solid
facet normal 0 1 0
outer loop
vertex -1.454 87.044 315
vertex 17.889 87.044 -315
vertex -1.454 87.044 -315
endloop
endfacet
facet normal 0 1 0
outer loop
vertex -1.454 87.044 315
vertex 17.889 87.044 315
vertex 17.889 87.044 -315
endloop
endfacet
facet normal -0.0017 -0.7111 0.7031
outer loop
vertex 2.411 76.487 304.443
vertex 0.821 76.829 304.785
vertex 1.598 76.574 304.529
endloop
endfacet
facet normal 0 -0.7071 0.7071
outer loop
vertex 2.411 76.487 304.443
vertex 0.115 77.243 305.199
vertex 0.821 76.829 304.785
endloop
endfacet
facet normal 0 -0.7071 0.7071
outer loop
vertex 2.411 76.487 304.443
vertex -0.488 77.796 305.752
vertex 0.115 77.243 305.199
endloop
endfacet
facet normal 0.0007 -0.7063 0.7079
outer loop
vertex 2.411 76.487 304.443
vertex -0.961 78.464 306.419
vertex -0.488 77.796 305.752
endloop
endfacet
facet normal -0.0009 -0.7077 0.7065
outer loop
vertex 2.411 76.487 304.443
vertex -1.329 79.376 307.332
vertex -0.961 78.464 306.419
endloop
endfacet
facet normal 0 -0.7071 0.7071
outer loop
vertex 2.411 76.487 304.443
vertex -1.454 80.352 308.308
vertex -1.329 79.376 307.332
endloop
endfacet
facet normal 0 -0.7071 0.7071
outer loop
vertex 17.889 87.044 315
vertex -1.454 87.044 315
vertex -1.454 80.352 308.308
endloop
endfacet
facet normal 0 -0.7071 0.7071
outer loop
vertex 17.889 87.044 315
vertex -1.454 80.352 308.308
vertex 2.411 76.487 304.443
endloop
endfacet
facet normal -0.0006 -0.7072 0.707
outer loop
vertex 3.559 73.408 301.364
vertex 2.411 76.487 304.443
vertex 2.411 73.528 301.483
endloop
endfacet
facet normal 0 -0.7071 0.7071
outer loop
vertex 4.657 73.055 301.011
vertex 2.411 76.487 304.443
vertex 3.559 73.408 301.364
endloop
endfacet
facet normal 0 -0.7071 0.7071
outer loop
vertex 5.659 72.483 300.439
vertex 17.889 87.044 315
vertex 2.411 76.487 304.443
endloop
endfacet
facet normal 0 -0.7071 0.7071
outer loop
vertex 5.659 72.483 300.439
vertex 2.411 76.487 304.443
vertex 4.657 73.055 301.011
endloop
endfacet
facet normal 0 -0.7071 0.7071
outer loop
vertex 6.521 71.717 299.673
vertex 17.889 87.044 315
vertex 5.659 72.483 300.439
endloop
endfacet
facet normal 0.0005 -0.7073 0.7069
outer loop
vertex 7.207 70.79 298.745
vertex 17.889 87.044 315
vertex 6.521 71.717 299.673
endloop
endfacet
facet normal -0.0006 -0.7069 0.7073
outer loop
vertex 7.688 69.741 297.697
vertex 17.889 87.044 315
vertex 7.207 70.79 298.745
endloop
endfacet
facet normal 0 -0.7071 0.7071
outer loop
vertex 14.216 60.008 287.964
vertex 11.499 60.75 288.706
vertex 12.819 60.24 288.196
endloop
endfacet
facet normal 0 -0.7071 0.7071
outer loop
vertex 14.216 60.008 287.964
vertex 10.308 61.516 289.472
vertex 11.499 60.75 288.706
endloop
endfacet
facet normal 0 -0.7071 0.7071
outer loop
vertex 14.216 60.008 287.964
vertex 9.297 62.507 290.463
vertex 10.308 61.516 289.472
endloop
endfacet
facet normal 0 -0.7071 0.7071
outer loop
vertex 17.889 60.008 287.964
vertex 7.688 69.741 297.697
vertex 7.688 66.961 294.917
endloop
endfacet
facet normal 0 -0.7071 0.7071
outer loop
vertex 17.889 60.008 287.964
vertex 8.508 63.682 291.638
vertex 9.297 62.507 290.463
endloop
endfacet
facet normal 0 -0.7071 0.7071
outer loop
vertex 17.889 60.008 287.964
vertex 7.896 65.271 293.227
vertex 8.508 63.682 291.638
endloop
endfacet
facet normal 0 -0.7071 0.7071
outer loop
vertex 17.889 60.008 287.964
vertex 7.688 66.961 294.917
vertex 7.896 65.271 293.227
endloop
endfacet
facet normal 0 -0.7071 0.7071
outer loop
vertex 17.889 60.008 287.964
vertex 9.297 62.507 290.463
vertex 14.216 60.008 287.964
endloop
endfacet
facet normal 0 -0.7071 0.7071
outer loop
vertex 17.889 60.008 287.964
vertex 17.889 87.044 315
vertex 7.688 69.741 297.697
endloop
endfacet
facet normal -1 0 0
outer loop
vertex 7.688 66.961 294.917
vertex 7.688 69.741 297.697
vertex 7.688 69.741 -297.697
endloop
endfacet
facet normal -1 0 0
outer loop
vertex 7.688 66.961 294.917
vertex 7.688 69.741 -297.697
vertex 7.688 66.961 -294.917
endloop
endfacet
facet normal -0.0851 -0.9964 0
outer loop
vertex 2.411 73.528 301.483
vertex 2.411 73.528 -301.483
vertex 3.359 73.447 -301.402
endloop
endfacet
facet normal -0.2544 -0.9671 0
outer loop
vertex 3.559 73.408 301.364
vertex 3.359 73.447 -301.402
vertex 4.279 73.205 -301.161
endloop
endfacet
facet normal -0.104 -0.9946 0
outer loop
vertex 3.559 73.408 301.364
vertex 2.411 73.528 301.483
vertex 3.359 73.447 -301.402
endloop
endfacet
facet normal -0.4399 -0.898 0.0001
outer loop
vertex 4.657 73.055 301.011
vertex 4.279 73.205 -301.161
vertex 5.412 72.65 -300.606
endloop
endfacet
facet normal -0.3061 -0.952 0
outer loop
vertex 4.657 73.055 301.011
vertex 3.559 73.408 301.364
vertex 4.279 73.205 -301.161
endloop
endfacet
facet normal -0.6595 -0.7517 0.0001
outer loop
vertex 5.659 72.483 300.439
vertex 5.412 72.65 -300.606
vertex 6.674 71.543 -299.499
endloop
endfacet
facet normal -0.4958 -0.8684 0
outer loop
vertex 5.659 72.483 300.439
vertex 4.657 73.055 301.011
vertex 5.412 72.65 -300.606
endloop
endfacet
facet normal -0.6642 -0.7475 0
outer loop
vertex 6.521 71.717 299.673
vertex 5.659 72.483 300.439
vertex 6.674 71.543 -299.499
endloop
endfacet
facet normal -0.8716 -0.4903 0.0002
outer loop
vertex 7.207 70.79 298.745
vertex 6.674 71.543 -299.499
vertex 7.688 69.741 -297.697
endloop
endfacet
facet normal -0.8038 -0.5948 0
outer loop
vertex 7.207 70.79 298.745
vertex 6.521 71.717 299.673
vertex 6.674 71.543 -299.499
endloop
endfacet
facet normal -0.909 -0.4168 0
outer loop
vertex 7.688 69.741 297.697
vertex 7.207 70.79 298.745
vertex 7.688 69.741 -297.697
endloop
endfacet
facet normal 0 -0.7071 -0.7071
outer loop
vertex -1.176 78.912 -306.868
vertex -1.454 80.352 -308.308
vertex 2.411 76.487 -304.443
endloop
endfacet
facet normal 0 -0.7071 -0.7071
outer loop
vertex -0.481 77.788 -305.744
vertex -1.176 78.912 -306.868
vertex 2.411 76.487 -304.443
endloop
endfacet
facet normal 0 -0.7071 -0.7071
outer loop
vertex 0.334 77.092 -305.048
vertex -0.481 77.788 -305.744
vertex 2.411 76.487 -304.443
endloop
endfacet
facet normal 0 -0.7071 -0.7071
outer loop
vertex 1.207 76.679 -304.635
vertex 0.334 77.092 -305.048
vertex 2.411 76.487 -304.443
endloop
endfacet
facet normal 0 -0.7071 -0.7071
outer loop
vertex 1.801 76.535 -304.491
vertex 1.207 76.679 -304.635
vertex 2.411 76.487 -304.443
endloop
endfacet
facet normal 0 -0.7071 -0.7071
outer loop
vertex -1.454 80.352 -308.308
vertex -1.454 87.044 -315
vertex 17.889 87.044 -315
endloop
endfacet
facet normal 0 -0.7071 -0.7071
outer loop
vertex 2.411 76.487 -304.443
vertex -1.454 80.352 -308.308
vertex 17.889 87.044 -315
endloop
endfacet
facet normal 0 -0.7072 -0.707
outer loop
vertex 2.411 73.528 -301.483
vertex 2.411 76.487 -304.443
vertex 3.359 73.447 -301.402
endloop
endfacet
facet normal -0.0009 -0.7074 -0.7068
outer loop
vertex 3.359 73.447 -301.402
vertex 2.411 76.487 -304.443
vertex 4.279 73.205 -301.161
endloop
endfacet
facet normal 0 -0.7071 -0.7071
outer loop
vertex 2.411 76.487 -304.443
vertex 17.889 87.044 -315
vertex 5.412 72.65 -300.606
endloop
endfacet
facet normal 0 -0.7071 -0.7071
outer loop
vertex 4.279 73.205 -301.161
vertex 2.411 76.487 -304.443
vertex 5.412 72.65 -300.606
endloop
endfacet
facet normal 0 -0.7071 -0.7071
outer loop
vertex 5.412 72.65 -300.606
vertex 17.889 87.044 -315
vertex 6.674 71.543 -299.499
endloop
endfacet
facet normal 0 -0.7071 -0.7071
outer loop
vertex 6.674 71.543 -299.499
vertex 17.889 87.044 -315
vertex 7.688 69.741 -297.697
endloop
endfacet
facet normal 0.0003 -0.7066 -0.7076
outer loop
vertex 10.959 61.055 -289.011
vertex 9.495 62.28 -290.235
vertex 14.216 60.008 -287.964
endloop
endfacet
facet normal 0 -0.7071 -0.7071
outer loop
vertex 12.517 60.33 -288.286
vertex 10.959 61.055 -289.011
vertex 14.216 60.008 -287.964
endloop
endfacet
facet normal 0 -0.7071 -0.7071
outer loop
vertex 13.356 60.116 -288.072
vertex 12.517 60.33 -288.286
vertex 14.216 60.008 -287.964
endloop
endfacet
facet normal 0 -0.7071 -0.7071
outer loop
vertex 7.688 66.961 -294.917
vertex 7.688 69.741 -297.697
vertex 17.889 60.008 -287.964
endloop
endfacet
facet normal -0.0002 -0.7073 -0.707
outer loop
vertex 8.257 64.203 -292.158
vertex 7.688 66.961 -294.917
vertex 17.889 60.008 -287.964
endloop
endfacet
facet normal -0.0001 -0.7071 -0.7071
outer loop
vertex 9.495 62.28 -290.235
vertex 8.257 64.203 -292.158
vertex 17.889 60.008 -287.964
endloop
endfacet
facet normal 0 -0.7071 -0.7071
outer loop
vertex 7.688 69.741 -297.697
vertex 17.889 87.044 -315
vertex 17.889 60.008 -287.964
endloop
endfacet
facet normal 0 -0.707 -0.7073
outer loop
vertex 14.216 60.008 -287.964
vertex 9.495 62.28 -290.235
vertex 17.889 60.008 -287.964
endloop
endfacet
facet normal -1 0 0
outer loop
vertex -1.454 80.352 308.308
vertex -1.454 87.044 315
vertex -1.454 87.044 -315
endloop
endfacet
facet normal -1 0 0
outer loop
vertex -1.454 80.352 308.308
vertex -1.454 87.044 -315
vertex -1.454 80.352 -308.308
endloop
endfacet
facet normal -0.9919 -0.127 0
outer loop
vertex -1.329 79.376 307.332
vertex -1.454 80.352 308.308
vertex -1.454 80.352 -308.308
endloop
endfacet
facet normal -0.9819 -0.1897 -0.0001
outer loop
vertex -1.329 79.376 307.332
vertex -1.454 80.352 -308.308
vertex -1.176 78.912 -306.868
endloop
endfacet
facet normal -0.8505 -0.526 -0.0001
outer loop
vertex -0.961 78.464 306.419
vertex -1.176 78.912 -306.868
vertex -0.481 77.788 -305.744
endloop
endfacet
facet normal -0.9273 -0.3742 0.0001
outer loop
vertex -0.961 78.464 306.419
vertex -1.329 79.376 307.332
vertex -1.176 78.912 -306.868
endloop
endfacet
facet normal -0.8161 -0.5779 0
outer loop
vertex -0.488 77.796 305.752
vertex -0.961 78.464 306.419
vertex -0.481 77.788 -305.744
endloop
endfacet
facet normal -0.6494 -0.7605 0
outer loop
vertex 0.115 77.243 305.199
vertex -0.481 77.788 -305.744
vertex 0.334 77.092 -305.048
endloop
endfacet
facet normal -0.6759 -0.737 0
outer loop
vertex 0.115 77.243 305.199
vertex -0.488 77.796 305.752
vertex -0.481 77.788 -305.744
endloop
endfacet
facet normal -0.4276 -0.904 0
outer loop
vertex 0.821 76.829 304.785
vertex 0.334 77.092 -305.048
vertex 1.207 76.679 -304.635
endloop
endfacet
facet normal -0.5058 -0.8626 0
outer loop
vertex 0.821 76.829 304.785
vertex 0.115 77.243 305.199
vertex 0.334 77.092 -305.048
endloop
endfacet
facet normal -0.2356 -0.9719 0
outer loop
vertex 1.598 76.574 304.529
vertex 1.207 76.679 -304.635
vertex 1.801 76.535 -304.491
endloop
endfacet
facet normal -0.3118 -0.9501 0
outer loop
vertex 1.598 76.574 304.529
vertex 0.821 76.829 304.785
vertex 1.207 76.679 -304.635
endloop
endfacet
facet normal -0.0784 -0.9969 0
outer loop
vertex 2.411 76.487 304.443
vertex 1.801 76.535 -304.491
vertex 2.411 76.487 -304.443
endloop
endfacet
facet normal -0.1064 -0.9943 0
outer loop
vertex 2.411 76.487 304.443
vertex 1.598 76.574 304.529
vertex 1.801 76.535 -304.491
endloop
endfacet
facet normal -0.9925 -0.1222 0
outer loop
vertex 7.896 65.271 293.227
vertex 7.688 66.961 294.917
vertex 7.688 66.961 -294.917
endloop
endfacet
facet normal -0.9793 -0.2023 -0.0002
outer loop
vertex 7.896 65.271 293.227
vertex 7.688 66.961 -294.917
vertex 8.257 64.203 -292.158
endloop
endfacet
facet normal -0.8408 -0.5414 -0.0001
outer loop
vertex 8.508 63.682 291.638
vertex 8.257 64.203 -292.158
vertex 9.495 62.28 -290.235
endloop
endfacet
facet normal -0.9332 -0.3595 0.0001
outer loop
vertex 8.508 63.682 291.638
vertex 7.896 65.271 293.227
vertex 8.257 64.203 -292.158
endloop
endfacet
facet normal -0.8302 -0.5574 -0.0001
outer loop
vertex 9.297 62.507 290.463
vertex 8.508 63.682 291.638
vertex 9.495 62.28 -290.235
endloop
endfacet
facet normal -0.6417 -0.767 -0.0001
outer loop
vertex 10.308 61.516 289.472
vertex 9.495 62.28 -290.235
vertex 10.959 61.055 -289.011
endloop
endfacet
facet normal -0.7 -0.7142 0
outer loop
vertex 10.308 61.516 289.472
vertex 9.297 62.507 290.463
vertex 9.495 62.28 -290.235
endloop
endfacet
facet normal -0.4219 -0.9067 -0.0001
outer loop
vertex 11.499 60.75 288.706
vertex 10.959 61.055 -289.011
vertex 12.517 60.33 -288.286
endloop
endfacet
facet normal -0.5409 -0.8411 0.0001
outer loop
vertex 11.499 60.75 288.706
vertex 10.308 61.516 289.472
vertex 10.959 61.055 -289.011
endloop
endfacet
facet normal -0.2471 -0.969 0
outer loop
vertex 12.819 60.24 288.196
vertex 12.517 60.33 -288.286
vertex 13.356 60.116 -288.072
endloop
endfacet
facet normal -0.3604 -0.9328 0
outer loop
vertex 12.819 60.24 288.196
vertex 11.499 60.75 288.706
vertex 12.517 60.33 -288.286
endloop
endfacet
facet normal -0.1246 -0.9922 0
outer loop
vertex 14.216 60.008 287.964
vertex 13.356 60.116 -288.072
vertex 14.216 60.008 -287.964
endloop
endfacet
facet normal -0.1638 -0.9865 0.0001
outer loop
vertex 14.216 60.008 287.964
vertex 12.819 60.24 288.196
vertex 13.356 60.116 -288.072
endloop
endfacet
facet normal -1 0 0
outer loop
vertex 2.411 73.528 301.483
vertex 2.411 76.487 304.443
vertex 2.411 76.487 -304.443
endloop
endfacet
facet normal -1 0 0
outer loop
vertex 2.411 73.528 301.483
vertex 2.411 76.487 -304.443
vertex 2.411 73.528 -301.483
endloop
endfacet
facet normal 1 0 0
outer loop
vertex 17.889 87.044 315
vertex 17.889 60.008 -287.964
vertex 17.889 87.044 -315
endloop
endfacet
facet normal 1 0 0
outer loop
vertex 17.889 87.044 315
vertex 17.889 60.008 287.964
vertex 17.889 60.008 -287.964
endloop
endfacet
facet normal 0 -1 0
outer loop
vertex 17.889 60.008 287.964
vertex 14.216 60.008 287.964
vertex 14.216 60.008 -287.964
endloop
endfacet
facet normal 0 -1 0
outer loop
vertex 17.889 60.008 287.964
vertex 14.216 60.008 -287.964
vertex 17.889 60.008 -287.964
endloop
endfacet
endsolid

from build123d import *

# Parameters (mm, degrees)
BASE_EXTRUDE_DEPTH = 315
CUT_EXTRUDE1_DEPTH = 328.294614629


with BuildPart() as part:
    # Sketch1 → Base-Extrude (new, symmetric)
    with BuildSketch(Plane.XY):
        with BuildLine():
            Line((17.889139296, 87.044491269), (-1.453845178, 87.044491269))
            Line((-1.453845178, 87.044491269), (-1.453845178, 80.35203196))
            ThreePointArc((-1.453845178, 80.35203196), (-0.32181751, 77.619075411), (2.411139039, 76.487047743))
            Line((2.411139039, 76.487047743), (2.411139039, 73.52781514))
            ThreePointArc((2.411139039, 73.52781514), (5.658603705, 72.483207804), (7.688030184, 69.741190405))
            Line((7.688030184, 69.741190405), (7.688030184, 66.961115937))
            ThreePointArc((7.688030184, 66.961115937), (9.575663464, 62.192626492), (14.215671126, 60.00814031))
            Line((14.215671126, 60.00814031), (17.889139296, 60.00814031))
            Line((17.889139296, 60.00814031), (17.889139296, 87.044491269))
        make_face()
    extrude(amount=BASE_EXTRUDE_DEPTH, both=True)

    # Sketch2 → Cut-Extrude1 (cut, symmetric)
    with BuildSketch(Plane(origin=(0, 0, 0), x_dir=(0, 0, -1), z_dir=(1, 0, 0))):
        Polygon((315, 87.044491269), (255, 27.044491269), (315, 27.044491269), align=None)
    cut_extrude1 = extrude(amount=CUT_EXTRUDE1_DEPTH, both=True, mode=Mode.SUBTRACT)

    # Mirror1: Cut-Extrude1 across plane
    add(cut_extrude1.mirror(Plane.XY), mode=Mode.SUBTRACT)


solid = part.part
